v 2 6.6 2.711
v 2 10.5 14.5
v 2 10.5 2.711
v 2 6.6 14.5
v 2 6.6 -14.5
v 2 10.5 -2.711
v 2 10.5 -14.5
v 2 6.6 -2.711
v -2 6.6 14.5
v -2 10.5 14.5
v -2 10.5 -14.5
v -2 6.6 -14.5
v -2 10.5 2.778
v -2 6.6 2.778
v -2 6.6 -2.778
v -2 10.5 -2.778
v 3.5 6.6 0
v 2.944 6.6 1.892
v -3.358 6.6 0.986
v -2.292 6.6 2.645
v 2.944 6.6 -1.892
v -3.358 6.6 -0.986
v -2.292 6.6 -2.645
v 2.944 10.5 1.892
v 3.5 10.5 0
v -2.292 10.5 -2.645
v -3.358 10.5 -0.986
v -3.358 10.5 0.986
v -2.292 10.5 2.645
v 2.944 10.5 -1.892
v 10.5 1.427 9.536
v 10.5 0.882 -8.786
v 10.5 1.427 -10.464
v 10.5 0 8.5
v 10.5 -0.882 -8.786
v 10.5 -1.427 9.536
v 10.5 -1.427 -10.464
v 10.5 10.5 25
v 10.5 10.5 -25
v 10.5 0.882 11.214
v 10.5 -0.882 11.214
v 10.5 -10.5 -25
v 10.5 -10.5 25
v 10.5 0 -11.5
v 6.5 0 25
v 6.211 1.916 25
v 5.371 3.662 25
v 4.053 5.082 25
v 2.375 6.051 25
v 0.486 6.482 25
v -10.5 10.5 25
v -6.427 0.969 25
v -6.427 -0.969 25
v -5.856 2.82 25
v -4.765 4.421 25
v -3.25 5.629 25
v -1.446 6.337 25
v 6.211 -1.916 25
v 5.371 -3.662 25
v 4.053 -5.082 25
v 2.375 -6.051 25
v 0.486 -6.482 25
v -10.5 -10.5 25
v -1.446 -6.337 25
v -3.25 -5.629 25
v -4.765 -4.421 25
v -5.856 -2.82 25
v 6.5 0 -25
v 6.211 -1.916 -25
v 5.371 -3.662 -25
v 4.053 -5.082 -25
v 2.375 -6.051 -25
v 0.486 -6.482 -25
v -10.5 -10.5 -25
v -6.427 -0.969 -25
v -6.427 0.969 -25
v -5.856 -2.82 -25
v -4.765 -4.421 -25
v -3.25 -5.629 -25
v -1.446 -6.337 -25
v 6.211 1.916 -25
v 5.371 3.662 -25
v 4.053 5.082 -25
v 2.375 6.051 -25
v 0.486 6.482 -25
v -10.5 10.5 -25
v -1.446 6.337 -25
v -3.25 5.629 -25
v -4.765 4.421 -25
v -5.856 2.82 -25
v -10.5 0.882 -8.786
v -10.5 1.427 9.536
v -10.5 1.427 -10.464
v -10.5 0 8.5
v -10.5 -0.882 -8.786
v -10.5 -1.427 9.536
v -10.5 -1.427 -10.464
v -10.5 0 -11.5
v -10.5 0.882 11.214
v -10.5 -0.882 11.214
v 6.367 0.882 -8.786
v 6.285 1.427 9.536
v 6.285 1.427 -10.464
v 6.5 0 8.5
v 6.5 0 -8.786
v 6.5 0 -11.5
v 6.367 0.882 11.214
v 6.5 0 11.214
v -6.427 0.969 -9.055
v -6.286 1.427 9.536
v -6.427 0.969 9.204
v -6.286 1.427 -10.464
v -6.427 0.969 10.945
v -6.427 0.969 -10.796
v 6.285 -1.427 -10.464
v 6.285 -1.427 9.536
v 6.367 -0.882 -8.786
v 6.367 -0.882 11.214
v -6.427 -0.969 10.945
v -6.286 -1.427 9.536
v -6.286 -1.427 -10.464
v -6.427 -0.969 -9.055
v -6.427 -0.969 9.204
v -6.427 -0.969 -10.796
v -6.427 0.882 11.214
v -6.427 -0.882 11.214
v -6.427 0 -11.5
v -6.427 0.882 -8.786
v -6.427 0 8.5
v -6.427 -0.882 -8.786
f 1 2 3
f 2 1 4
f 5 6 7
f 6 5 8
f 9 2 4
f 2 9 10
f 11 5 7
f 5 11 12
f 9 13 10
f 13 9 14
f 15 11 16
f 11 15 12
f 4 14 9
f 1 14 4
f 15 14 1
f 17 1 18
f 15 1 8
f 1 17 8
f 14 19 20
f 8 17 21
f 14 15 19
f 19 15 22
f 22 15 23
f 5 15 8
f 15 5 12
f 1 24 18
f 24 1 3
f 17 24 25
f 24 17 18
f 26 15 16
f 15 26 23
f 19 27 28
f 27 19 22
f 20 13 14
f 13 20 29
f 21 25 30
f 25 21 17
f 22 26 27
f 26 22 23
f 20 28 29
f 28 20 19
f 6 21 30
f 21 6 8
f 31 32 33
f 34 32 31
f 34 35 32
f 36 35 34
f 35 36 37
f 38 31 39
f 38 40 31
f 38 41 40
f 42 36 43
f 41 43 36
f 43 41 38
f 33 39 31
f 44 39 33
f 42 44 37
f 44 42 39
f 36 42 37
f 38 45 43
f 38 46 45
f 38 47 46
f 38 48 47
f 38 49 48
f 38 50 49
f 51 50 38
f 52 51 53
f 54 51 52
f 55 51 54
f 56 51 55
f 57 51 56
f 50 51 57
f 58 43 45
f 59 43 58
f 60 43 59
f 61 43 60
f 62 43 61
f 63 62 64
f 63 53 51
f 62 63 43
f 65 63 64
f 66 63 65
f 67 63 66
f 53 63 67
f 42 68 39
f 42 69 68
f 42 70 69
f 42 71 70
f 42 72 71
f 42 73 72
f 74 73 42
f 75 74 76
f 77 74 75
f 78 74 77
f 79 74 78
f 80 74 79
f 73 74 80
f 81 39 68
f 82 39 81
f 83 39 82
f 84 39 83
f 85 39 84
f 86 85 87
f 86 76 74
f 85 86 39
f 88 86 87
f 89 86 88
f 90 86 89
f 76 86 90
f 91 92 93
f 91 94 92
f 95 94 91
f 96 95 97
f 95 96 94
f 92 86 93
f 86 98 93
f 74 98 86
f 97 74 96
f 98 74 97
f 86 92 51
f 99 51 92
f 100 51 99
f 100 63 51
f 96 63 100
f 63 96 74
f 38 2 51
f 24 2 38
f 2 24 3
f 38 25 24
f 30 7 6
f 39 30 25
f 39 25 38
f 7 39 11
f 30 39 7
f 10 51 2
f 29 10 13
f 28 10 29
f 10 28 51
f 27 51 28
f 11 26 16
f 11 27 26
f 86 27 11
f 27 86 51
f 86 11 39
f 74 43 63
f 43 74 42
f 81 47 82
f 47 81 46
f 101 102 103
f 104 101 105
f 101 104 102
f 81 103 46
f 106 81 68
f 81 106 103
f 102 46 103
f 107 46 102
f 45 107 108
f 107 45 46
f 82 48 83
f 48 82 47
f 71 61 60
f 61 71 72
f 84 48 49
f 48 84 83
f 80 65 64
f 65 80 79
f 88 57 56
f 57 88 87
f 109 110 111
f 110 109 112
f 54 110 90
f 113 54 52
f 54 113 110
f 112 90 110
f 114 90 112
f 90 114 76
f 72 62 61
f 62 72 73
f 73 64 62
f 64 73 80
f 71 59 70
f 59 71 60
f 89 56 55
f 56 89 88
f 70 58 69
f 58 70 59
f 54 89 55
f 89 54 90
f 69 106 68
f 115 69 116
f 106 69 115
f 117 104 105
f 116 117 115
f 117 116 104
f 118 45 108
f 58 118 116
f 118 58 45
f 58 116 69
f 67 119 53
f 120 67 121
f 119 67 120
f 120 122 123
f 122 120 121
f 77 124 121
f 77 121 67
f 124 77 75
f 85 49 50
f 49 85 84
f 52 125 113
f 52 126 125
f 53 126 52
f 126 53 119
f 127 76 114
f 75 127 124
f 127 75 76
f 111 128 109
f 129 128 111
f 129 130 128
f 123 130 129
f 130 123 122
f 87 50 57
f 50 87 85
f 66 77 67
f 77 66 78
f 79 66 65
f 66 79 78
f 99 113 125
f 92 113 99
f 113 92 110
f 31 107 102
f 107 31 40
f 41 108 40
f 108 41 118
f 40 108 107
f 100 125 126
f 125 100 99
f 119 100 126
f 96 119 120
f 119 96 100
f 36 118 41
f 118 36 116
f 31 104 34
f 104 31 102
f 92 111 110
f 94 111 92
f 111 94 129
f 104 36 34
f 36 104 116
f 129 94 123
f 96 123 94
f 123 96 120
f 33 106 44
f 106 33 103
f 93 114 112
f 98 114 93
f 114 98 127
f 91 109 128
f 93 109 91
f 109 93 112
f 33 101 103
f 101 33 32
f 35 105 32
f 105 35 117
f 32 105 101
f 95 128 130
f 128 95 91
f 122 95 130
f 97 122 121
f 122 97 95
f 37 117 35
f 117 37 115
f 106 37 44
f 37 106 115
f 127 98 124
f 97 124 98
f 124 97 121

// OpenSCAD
difference() {
cube([21,21,50], true); 
cylinder(120,6.5,6.5, true);

translate([0,0,10]) {rotate([0,90,0]) { cylinder(40,1.5,1.5, true);}}
translate([0,0,-10]) {rotate([0,90,0]) { cylinder(40,1.5,1.5, true);}}

translate([0,8.6,0]) {
    cube([4,4,29], true); 
    rotate([90,0,0]) { cylinder(4,3.5,3.5, true);}
}
}
